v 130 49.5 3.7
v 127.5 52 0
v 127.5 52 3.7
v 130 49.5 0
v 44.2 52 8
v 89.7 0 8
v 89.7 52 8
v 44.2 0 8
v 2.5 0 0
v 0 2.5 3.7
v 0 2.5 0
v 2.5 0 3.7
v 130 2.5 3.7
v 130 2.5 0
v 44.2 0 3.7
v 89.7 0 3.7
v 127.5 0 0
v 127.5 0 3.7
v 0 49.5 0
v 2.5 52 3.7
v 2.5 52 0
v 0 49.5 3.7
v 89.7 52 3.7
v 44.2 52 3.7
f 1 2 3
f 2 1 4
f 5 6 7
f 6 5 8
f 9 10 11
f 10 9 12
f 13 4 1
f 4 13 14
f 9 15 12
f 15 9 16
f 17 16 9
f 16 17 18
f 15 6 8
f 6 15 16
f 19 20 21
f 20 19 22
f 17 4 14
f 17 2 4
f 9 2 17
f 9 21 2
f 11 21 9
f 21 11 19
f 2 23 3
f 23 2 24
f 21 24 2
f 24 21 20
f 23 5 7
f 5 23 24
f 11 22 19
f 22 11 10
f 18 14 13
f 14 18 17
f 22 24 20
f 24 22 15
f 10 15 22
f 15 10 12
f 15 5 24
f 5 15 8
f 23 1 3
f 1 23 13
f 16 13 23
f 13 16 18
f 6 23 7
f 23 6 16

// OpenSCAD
$fn = 32;

// ----------------------------------------------------------------------
// Stepped bar: centerstep, 130 x 52 x 8/3.7 mm
// ----------------------------------------------------------------------

// --- parameters (mm) ---
bar_l = 130;              // bar length, X
bar_w = 52;               // bar width, Y
plate_t = 8;              // thickness of the thick zone, Z
thin_t = 3.7;             // thickness of the thin zone
corner_c = 2.5;           // corner chamfer of the bar
step_cut = 4.3;           // material removed from the thin zone
thick_from = 44.2;        // start of the thick middle zone
thick_to = 89.7;          // end of the thick middle zone
depth_1 = 4.3;            // depth of cut 1 from the top face
depth_2 = 4.3;            // depth of cut 2 from the top face

profile = [[2.5, 0], [127.5, 0], [130, 2.5], [130, 49.5], [127.5, 52], [2.5, 52], [0, 49.5], [0, 2.5]];  // primary outline, 8 points, counter clockwise
void_1 = [[-1, -1], [44.2, -1], [44.2, 53], [-1, 53]];  // thin left end, 4 points
void_2 = [[89.7, -1], [131, -1], [131, 53], [89.7, 53]];  // thin right end, 4 points

// --- the one profile operation ---
difference() {
  linear_extrude(height = plate_t) polygon(points = profile);
  translate([0, 0, plate_t - depth_1])
    linear_extrude(height = depth_1 + 1) polygon(points = void_1);
  translate([0, 0, plate_t - depth_2])
    linear_extrude(height = depth_2 + 1) polygon(points = void_2);
}
